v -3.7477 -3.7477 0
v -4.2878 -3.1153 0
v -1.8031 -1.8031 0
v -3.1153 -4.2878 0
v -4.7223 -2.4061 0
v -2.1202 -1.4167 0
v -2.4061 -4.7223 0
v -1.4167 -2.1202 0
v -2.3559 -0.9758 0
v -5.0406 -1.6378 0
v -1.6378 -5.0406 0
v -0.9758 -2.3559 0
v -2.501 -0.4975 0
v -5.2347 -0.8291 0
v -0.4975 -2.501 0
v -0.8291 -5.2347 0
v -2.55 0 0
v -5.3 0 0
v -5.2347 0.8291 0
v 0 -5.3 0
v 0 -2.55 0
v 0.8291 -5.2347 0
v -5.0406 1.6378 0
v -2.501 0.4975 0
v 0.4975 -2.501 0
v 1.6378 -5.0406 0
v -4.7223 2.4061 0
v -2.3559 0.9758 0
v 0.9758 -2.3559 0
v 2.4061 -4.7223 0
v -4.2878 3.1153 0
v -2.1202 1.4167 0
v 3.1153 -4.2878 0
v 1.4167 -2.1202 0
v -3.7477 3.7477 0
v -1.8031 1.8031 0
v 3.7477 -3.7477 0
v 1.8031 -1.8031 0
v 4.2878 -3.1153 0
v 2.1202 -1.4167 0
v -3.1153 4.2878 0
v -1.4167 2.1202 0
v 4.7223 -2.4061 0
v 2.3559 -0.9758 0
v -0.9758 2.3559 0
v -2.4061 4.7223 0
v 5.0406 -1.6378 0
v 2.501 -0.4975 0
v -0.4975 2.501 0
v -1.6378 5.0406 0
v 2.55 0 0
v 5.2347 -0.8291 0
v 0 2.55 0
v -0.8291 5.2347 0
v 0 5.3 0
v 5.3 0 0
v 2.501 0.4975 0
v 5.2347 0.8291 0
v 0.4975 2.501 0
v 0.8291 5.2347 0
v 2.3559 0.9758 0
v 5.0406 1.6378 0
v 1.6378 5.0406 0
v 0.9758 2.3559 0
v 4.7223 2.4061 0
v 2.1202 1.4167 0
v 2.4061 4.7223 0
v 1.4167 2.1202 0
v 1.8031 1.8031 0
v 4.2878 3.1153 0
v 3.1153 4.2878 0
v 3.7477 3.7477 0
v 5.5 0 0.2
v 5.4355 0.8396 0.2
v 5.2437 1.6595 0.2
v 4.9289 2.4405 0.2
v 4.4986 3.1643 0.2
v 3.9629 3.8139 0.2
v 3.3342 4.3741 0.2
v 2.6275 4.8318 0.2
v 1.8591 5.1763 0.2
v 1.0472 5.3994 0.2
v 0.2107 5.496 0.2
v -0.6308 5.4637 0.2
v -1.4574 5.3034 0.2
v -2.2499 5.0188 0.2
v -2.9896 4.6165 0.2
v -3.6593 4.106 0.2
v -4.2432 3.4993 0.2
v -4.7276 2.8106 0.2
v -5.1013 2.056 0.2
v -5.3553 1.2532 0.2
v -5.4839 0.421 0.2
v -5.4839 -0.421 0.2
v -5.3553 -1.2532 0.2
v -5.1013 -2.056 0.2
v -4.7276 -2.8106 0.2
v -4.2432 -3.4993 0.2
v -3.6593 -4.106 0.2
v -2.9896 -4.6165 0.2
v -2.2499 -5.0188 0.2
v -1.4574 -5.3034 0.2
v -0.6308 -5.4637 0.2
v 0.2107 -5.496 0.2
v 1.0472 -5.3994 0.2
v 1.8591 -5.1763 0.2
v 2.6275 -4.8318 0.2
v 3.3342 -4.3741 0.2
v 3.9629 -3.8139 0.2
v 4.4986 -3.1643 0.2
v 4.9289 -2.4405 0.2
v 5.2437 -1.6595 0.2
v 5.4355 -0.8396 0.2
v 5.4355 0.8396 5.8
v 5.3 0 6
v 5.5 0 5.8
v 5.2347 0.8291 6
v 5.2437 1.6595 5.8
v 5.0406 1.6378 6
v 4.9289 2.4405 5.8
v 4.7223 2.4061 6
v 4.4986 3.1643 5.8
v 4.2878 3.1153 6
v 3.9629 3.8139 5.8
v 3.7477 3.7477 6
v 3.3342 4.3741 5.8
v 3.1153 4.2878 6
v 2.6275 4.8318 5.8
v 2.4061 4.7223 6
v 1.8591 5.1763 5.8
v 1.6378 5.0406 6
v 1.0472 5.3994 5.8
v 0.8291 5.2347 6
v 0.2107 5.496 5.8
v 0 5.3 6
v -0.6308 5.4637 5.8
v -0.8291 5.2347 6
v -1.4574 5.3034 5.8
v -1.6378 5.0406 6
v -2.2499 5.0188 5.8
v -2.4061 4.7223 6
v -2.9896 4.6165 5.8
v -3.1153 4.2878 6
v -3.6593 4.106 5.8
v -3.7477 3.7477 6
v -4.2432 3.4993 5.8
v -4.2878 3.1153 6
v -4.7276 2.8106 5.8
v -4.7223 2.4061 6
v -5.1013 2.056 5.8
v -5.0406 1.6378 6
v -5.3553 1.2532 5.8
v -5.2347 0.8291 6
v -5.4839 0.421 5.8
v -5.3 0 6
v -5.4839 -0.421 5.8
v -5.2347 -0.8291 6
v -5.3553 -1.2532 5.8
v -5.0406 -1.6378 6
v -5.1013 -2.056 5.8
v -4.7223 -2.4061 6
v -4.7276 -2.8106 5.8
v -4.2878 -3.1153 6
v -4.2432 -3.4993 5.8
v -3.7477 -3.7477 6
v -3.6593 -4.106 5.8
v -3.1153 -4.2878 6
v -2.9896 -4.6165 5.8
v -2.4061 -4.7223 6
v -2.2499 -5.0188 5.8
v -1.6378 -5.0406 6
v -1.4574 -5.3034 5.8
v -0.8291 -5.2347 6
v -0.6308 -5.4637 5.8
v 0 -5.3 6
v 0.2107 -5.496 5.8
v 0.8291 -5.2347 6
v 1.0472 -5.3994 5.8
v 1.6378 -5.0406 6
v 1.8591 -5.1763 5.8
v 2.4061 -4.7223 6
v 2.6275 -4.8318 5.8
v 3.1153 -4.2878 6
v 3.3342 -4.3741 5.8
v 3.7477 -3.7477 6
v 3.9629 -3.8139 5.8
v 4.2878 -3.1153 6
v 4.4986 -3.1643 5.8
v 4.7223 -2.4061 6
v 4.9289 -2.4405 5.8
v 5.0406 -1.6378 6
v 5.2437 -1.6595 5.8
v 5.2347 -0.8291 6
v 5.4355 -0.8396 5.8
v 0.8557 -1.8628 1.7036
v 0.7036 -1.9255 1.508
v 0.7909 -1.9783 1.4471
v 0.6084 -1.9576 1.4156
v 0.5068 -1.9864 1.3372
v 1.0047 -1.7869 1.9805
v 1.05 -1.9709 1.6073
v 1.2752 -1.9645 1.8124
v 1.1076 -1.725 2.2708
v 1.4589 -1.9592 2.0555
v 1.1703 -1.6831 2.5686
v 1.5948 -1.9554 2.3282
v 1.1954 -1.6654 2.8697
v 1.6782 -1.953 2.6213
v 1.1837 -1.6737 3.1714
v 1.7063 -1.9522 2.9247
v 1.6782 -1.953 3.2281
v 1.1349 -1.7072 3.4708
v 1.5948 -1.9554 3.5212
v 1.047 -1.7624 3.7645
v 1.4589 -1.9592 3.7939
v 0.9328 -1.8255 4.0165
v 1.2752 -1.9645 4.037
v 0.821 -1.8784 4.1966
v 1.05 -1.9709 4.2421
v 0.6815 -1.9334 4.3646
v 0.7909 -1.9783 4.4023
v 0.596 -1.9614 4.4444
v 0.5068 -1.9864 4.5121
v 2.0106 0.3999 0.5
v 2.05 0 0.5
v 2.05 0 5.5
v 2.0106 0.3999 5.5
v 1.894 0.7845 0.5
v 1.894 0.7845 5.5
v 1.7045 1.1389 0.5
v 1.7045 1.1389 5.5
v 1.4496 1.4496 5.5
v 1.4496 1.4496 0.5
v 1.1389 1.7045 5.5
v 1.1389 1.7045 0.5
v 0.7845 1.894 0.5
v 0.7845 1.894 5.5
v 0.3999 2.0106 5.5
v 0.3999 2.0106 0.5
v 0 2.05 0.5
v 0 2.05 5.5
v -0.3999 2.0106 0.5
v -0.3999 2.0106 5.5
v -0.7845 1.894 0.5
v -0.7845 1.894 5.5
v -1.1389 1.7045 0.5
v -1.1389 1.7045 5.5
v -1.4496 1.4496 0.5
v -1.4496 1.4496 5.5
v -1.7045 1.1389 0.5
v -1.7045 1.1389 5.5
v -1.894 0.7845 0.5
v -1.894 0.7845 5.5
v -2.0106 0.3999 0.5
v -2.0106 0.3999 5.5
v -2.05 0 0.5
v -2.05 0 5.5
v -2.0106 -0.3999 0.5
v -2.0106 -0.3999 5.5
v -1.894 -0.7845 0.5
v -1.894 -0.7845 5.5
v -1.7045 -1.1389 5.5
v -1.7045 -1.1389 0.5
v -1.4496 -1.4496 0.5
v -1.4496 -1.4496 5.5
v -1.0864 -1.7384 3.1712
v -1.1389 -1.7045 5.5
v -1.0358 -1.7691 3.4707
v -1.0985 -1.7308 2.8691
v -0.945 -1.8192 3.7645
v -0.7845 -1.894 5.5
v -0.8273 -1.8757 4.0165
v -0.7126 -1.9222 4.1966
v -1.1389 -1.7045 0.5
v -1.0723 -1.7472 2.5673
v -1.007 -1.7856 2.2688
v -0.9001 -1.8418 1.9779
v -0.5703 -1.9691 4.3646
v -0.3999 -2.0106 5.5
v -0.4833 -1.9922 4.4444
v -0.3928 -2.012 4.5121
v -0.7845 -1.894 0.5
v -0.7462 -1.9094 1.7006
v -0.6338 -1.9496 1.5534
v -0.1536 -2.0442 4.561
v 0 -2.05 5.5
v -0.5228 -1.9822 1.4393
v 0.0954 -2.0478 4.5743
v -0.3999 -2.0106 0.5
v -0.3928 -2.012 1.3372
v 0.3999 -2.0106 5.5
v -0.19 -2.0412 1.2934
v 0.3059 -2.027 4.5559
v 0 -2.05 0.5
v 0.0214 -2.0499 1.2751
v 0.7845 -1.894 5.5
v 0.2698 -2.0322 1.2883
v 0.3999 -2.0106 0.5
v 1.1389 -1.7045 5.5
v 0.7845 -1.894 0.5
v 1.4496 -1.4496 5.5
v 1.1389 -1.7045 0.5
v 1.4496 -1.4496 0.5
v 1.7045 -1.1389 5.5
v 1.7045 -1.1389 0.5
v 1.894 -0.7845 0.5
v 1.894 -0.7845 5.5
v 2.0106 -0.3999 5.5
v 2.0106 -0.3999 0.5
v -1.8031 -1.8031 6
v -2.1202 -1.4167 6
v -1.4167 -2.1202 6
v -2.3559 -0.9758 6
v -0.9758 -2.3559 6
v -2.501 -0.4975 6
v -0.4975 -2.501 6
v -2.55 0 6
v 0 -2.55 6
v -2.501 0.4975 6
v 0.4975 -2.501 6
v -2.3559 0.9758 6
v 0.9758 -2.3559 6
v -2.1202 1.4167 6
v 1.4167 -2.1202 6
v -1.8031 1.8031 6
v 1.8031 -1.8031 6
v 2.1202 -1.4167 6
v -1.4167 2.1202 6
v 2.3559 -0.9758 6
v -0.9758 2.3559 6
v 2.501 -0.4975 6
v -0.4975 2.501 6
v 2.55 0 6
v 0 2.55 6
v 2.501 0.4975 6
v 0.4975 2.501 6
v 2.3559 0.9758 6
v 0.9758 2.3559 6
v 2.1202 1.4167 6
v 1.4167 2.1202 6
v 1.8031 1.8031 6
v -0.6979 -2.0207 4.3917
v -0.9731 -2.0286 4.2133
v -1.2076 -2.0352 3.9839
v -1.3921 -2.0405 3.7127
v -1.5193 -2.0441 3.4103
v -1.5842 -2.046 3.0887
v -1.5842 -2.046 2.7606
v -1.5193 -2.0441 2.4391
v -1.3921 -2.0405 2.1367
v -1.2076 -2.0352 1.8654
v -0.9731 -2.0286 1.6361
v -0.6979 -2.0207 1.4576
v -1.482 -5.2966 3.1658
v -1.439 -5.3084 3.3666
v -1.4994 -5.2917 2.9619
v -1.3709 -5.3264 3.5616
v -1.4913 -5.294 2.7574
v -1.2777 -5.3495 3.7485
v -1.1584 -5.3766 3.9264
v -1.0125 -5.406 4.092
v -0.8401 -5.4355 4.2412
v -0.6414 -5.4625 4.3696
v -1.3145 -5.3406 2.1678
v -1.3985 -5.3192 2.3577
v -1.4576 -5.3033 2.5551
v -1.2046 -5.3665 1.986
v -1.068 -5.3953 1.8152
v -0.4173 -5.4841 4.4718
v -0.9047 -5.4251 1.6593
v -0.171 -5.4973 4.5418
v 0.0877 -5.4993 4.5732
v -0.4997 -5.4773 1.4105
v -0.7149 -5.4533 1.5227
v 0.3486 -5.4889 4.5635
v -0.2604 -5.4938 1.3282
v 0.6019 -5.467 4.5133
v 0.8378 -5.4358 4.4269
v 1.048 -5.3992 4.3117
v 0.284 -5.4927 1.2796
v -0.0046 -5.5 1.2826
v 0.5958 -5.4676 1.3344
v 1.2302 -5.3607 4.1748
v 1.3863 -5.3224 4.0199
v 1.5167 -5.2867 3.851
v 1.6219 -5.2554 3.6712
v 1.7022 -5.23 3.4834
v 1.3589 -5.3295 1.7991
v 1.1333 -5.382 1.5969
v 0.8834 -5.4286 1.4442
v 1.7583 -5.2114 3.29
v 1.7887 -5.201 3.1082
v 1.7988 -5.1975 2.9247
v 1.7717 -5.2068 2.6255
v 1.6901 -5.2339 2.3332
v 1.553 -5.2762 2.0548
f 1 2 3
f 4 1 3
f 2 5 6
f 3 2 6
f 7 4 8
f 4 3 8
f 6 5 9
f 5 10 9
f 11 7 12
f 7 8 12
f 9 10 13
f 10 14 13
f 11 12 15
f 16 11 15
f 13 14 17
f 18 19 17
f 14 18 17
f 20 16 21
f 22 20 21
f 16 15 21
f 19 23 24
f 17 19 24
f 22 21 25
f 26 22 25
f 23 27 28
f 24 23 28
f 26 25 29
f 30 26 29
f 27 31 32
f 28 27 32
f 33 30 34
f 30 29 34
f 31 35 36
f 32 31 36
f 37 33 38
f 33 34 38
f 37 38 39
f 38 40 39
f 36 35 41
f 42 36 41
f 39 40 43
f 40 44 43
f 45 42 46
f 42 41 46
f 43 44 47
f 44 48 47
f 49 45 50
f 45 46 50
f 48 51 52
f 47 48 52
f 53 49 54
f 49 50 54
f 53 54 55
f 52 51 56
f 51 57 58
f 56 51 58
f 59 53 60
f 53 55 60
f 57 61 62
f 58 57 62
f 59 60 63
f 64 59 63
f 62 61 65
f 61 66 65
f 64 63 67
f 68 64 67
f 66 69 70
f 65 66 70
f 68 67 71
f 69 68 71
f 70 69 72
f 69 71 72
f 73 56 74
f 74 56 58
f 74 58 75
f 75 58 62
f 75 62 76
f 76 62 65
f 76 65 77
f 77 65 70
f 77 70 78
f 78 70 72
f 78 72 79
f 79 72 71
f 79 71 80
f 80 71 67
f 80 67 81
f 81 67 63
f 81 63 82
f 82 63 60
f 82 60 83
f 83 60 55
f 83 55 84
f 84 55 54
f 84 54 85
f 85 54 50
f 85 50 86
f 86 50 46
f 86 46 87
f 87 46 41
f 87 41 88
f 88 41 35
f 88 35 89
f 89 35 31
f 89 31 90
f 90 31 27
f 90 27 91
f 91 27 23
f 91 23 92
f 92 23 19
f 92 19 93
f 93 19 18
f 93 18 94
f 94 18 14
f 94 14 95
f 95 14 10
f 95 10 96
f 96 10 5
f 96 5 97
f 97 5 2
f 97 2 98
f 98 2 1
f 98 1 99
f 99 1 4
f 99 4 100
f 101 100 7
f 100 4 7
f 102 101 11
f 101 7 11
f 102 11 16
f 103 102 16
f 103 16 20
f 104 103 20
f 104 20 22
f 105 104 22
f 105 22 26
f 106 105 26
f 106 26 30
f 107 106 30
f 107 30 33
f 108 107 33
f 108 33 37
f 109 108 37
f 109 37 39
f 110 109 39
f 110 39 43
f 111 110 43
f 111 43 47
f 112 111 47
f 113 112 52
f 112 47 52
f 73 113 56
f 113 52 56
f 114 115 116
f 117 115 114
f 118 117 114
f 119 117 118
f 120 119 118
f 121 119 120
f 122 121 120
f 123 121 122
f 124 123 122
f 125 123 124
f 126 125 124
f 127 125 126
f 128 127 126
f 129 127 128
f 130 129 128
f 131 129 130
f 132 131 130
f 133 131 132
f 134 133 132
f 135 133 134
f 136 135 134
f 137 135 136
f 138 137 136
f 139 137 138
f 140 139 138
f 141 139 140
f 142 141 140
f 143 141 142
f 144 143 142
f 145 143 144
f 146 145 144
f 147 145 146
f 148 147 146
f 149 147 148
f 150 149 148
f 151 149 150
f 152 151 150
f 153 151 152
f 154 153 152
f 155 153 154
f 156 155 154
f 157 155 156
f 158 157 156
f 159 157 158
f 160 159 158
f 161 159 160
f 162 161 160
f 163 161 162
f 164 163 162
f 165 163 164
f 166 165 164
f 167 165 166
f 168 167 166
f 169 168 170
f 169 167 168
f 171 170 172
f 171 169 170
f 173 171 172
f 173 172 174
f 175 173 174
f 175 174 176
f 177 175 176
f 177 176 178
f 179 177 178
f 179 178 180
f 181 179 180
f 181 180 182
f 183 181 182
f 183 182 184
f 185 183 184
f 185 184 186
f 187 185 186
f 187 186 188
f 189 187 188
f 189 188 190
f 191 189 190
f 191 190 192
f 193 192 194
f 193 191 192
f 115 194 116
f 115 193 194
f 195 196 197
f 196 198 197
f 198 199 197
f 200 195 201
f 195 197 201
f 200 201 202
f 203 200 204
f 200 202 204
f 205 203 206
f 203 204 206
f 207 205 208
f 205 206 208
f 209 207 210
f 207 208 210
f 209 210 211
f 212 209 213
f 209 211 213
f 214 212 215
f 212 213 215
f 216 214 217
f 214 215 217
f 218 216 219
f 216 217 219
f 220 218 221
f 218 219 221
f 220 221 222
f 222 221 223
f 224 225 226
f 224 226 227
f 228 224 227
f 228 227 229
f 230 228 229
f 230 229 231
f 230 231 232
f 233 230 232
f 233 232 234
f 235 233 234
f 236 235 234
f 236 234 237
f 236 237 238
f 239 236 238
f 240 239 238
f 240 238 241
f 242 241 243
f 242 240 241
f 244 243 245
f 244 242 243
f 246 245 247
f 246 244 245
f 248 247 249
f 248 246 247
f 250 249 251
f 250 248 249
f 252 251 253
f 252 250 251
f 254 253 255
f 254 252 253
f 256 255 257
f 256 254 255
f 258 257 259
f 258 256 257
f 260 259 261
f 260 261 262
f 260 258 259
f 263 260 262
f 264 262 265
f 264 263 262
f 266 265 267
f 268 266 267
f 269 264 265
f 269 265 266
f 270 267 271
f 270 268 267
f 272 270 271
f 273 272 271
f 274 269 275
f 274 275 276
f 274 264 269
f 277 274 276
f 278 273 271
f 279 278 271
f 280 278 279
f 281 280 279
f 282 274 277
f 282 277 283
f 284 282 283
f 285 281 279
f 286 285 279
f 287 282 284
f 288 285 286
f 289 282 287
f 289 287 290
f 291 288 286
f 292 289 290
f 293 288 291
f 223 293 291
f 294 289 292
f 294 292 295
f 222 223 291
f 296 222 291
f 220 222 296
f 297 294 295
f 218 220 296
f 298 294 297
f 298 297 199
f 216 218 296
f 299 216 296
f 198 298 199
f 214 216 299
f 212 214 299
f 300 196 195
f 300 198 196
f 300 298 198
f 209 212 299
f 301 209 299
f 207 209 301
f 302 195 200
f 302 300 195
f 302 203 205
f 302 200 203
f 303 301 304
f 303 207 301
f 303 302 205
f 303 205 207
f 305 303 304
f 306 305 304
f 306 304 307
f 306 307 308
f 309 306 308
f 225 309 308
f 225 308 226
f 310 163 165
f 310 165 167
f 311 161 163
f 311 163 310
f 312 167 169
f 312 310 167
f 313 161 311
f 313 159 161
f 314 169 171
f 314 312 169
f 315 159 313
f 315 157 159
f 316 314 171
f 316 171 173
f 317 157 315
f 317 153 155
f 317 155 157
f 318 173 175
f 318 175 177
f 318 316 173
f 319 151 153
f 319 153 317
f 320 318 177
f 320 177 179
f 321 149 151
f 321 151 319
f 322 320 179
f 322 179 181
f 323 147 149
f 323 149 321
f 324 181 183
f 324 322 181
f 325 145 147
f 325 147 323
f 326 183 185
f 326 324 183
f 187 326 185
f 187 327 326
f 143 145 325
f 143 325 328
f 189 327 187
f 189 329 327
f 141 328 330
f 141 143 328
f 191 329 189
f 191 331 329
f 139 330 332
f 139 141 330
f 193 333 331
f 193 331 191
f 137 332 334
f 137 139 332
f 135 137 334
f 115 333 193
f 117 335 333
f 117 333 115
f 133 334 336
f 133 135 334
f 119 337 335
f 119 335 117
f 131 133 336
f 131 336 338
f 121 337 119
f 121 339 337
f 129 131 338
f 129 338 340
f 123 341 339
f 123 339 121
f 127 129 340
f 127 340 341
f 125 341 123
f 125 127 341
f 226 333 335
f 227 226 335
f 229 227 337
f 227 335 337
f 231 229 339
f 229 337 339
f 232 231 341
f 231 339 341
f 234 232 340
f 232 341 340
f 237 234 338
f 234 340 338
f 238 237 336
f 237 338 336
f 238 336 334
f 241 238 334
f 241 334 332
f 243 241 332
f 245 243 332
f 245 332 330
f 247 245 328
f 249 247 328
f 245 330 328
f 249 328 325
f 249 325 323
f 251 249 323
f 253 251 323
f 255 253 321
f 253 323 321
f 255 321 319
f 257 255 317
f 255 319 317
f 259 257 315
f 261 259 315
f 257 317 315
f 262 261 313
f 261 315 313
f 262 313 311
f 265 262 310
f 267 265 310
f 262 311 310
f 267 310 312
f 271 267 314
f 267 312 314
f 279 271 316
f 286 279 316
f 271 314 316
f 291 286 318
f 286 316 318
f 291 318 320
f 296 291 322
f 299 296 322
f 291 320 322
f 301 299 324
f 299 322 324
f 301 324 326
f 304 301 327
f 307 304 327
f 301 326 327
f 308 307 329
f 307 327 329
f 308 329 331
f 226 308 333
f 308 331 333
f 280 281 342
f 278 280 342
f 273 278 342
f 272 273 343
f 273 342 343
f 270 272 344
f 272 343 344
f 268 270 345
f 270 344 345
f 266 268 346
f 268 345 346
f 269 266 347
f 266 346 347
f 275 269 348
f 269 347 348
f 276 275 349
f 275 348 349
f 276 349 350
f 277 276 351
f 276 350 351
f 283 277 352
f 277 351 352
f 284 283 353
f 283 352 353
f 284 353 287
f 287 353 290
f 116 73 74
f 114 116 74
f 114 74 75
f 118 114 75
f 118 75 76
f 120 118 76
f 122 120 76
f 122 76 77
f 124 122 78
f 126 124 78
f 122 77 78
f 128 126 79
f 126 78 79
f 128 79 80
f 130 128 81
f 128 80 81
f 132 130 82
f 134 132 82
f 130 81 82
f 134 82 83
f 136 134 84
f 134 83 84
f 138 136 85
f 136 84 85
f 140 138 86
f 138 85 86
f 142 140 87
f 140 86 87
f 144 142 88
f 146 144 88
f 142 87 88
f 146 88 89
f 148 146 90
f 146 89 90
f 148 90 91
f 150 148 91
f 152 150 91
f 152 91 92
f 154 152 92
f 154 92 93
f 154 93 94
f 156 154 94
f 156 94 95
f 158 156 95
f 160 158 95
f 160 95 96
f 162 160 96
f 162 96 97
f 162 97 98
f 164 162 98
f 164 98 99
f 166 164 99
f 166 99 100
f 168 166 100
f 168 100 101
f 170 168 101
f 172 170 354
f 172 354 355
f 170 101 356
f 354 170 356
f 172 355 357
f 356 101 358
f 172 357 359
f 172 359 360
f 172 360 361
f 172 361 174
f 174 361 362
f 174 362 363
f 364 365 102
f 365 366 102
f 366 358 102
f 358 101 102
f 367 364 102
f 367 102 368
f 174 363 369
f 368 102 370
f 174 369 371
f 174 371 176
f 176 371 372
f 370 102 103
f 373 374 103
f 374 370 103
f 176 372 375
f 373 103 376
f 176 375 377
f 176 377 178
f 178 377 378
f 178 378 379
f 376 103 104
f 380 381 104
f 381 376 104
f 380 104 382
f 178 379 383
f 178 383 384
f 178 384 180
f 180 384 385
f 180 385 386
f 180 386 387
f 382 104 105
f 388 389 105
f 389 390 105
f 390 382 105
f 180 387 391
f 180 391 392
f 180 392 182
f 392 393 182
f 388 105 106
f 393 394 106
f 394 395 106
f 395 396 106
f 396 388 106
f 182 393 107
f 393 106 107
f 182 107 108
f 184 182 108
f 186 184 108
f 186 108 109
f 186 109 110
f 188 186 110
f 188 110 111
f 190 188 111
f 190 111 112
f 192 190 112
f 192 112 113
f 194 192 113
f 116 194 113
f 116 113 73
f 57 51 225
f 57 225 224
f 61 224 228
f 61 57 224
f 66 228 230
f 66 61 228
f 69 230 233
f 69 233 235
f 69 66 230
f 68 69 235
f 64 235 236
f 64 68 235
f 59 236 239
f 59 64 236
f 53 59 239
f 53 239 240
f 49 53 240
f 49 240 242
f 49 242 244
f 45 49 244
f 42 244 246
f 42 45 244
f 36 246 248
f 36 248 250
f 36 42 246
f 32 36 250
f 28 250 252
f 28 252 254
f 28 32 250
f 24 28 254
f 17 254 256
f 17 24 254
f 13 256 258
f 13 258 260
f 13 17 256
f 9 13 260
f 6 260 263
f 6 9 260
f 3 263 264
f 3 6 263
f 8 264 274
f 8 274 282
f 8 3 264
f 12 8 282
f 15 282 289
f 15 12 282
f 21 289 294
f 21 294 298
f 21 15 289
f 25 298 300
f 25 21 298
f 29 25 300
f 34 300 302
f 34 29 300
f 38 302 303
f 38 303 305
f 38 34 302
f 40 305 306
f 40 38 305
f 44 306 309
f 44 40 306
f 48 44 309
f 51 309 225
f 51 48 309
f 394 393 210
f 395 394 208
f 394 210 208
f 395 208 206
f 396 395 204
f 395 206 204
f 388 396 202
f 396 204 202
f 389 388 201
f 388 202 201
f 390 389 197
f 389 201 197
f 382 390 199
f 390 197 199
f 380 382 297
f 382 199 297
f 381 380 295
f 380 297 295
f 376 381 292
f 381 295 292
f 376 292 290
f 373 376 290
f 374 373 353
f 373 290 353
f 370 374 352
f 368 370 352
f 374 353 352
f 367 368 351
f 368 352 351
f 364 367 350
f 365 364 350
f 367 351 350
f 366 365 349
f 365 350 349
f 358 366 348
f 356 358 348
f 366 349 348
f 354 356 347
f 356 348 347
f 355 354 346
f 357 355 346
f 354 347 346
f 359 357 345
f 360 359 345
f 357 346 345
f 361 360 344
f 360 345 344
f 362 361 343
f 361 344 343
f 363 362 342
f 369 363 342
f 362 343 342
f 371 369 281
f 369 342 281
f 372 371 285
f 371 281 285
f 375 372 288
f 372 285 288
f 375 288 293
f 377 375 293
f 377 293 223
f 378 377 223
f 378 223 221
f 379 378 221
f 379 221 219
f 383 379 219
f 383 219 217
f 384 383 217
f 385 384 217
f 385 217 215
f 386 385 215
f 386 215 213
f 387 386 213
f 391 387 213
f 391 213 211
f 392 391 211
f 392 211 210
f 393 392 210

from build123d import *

# Parameters (mm, degrees)
SKETCH1_R                 = 5.5
SKETCH1_R_2               = 2.05
BOSS_EXTRUDE1_DEPTH       = 6
CHAMFER1_SIZE             = 0.5
M4X0_7_TAPPED_HOLE1_D     = 3.3
M4X0_7_TAPPED_HOLE1_DEPTH = 3.5
M4X0_7_TAPPED_HOLE1_TIP   = 0.991420021
CHAMFER2_SIZE             = 0.2


with BuildPart() as part:
    # Sketch1 → Boss-Extrude1 (new body)
    with BuildSketch(Plane.XY):
        Circle(SKETCH1_R)
        Circle(SKETCH1_R_2, mode=Mode.SUBTRACT)
    extrude(amount=BOSS_EXTRUDE1_DEPTH)

    # Chamfer1
    chamfer1_edges = [part.edges().sort_by_distance(p)[0] for p in [
        (-2.05, 0, 0),
        (-2.05, 0, 6),
    ]]
    chamfer(chamfer1_edges, length=CHAMFER1_SIZE)

    # M4x0.7 Tapped Hole1
    with Locations(Plane(origin=(0.156712009, -5.497766942, 2.924685325), x_dir=(-0.999593989, -0.028493093, 0), z_dir=(0.028493093, -0.999593989, 0))):
        with Locations((0, 0)):
            Hole(M4X0_7_TAPPED_HOLE1_D / 2, depth=M4X0_7_TAPPED_HOLE1_DEPTH)
            with Locations((0, 0, -(M4X0_7_TAPPED_HOLE1_DEPTH + M4X0_7_TAPPED_HOLE1_TIP / 2))):  # 118° drill point
                Cone(0, M4X0_7_TAPPED_HOLE1_D / 2, M4X0_7_TAPPED_HOLE1_TIP, mode=Mode.SUBTRACT)

    # Chamfer2
    chamfer2_edges = [part.edges().sort_by_distance(p)[0] for p in [
        (-5.5, 0, 0),
        (-5.5, 0, 6),
    ]]
    chamfer(chamfer2_edges, length=CHAMFER2_SIZE)


solid = part.part
